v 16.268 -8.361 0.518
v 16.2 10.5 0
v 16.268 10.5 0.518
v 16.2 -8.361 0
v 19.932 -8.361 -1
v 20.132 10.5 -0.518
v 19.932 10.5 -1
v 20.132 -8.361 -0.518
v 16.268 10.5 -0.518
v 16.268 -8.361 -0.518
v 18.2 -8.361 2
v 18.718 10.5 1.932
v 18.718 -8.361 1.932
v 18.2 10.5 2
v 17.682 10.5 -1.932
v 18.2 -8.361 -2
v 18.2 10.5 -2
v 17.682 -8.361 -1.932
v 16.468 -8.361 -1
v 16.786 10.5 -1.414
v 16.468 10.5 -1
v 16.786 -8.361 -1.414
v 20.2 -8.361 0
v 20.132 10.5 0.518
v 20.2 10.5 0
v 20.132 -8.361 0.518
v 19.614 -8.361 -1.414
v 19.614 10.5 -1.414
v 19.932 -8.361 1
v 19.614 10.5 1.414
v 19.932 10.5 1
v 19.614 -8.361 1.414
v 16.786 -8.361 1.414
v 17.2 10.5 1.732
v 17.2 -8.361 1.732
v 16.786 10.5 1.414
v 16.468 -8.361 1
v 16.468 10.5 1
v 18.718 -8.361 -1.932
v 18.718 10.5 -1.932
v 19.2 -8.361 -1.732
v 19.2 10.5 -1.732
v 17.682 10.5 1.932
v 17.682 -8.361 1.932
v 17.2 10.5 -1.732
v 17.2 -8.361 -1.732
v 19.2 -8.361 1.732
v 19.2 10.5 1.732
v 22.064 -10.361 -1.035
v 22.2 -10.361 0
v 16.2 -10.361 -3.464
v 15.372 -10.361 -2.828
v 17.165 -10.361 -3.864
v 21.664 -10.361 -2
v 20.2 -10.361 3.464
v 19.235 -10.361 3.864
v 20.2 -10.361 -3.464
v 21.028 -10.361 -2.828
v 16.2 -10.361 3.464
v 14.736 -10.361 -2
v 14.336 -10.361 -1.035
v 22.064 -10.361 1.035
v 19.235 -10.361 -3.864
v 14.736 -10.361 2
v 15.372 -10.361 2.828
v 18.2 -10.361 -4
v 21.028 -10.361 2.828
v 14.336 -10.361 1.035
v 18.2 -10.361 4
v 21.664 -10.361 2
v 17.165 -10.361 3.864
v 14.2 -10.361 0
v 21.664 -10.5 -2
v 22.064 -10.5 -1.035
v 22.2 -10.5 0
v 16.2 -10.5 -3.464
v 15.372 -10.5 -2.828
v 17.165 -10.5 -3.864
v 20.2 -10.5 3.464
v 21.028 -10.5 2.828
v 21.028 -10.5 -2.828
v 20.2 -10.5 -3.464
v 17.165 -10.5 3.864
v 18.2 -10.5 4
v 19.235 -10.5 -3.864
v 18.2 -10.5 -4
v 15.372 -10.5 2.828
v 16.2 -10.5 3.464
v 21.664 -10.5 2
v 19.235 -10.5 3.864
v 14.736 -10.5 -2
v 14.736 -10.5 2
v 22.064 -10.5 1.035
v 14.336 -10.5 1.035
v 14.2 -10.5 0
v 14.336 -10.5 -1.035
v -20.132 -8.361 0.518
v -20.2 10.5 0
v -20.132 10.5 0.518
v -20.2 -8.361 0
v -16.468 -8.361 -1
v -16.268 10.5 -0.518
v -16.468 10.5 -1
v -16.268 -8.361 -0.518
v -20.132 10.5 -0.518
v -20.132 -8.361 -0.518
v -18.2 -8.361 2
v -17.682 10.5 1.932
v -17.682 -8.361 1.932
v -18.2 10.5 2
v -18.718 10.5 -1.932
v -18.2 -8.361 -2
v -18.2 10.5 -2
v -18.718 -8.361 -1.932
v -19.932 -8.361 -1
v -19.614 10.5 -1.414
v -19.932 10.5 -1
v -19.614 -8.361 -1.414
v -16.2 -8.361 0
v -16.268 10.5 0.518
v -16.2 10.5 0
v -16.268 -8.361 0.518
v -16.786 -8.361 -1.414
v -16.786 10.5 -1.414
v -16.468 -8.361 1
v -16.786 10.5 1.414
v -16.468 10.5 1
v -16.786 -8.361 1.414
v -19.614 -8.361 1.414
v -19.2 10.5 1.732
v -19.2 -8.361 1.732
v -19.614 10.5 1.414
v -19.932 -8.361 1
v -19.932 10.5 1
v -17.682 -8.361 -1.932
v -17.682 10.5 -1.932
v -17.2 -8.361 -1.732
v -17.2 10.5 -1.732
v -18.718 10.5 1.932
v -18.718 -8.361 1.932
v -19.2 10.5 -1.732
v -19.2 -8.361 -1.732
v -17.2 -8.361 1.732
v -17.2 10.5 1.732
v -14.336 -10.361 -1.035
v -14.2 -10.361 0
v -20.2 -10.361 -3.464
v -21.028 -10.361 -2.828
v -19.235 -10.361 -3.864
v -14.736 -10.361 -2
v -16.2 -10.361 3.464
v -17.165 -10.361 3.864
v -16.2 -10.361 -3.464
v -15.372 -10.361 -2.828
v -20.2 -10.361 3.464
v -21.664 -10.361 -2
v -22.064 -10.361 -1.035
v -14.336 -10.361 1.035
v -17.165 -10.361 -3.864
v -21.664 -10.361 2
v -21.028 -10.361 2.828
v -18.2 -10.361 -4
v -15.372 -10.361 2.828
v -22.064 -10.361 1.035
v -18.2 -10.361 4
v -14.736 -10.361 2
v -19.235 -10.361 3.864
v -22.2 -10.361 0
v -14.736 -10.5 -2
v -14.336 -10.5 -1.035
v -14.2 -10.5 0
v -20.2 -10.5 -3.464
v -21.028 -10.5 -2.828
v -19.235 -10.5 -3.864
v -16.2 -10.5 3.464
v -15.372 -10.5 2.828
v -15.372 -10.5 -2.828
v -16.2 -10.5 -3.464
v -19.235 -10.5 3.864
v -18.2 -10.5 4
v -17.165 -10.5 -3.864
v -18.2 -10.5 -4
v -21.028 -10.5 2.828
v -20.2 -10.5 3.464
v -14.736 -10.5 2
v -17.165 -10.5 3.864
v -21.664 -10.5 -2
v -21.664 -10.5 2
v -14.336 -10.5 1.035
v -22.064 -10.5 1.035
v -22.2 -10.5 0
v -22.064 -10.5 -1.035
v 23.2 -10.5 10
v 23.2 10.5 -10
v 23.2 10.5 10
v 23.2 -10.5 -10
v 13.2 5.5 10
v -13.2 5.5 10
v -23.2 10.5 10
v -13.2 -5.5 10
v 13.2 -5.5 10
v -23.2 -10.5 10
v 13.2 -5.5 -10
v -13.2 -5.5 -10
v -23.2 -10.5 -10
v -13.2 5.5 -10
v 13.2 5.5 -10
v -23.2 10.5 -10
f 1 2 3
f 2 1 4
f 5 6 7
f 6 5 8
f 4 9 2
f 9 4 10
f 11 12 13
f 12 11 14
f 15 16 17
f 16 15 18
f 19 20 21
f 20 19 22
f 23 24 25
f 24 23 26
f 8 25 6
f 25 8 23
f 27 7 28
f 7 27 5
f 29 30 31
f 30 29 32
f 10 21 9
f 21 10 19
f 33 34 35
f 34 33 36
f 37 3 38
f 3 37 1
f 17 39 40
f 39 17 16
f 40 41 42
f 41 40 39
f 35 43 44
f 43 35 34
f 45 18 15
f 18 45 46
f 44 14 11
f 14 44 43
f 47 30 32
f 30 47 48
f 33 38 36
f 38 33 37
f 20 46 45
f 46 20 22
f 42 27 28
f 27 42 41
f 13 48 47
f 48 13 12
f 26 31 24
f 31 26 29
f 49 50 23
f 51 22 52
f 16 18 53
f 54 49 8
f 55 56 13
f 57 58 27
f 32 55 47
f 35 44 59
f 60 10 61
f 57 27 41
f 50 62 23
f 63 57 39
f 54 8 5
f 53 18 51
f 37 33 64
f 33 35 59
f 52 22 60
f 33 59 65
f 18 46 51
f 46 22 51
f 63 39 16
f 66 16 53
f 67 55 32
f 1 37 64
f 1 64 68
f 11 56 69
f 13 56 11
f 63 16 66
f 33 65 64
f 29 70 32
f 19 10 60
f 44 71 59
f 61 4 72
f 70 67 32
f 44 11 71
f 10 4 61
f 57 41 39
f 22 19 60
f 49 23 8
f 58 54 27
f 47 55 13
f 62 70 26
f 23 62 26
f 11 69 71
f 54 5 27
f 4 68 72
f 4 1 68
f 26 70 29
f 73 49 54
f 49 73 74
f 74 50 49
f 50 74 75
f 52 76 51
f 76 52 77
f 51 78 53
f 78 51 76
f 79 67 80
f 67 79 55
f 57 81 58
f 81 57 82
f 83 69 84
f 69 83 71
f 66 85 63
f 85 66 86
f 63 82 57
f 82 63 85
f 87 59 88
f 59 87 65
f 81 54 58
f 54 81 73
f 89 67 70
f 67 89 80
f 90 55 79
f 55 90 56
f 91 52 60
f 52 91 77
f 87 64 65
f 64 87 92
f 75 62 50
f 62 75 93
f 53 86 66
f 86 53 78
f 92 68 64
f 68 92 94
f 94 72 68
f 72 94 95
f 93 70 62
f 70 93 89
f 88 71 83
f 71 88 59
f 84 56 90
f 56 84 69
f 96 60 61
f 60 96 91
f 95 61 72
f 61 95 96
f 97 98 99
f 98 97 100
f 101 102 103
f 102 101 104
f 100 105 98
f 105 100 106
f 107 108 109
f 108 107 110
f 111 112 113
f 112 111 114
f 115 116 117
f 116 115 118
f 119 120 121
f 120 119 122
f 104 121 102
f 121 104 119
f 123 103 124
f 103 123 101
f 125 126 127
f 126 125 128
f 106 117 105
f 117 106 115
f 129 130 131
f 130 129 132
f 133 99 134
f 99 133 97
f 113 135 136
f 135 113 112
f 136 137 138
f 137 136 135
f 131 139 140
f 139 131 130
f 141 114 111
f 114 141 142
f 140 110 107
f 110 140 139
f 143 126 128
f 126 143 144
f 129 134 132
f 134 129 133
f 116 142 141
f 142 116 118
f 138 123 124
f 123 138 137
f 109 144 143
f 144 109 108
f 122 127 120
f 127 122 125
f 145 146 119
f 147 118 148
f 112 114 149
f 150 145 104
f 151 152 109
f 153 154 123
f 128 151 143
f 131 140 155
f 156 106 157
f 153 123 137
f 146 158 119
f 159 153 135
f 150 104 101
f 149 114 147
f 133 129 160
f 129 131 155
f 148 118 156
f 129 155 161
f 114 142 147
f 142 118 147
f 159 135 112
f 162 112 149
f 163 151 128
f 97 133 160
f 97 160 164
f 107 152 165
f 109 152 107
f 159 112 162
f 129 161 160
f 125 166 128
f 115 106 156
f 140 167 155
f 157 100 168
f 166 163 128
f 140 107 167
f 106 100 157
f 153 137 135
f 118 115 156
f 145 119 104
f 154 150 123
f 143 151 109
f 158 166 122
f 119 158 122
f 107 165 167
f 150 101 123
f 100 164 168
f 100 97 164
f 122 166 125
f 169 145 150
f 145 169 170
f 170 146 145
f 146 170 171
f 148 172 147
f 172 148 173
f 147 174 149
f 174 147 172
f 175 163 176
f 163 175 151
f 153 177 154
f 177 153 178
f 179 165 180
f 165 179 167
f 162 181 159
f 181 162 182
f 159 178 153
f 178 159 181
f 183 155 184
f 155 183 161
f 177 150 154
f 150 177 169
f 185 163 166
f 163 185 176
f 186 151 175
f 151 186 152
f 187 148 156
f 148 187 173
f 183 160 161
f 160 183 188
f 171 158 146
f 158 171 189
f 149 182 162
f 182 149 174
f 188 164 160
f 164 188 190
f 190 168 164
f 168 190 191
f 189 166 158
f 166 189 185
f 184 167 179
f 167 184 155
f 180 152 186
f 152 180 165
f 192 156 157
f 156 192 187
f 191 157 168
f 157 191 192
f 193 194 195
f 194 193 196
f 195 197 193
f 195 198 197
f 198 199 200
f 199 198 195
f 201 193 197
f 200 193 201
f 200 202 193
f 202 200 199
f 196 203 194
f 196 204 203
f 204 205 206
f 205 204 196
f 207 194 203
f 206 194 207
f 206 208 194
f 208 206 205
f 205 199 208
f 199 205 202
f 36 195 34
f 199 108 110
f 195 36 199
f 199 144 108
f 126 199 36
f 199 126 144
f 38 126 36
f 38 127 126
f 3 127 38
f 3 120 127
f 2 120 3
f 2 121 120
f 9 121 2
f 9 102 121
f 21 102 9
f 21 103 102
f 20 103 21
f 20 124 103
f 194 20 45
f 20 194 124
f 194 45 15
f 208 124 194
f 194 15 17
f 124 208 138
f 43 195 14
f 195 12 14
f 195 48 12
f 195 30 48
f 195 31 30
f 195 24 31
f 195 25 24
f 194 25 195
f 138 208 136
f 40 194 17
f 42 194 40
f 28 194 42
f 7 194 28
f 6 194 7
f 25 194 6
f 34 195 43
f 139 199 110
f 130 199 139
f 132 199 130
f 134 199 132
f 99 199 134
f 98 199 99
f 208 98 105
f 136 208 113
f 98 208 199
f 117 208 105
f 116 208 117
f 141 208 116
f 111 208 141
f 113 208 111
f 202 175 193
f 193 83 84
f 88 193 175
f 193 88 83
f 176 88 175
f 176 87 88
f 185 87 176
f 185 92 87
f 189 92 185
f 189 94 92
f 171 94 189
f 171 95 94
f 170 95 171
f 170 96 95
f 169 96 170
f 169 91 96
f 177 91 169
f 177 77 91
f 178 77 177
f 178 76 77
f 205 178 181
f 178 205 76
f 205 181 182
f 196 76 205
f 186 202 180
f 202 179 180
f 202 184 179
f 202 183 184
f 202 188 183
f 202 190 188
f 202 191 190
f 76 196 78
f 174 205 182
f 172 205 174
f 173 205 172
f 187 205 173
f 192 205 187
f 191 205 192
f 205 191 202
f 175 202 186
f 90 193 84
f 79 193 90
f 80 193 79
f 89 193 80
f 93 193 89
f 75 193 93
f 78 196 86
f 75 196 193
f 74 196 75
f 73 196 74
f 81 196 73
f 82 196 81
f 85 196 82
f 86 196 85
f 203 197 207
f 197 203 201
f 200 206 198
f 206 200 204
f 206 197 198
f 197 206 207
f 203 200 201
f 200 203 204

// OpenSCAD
// Bull nose pliers holder 3D Design

// Copyright (c) 2014 by Jeremy Bennett <jeremy.bennett@embecosm.com>

// Crimp holder 3D Design is licensed under a Creative Commons
// Attribution-ShareAlike 3.0 Unported License.

// You should have received a copy of the license along with this work.  If not,
// see <http://creativecommons.org/licenses/by-sa/3.0/>.

// -----------------------------------------------------------------------------


use <MCAD/regular_shapes.scad>


// A screw hole with a countersink
module screwhole (bore, length) {
	iota = length / 100;
	half_length = length / 2 + iota;
	full_length = half_length * 2;
	union () {
		cylinder (r = bore / 2, h = full_length, center = true, $fn = 24);
		translate (v = [0, 0, -half_length + bore / 4 + bore / 10])
			cylinder (r1 = bore, r2 = bore / 2, h = bore / 2, center = true, $fn = 24);
		translate (v = [0, 0, -half_length + bore / 20])
			cylinder (r = bore, h = bore / 10, center = true, $fn = 24);
	}
}


// A screw hole for a screw parallel with the Y axis
module screwhole_y (bore, length, x_off, z_off) {
	translate (v = [x_off, 0, z_off])
		rotate (a = [-90, 0, 0])
			screwhole (bore = bore, length = length);
}


// Support with screwholes
module tool_support () {
	back_thickness = 5;
	front_thickness = 5;
	side_thickness = 10;
	hole_width = 26.4;
	hole_depth = 11;
	block_width = hole_width + side_thickness * 2;
	block_depth = hole_depth + back_thickness + front_thickness;
	height = 20;
	screw_x_off = (hole_width + side_thickness) / 2;
	screw_z_off = 0;
	iota = 0.1;
	difference () {
		cube (size = [block_width, block_depth, height], center = true);
		// hole for strippers
		translate (v = [0, (back_thickness - front_thickness) / 2, 0])
			cube (size = [ hole_width, hole_depth, height + iota], center = true);
		// screw_holes
		screwhole_y (bore = 4, length = block_depth + iota, x_off =  screw_x_off,
		             z_off = screw_z_off);
		screwhole_y (bore = 4, length = block_depth + iota, x_off = -screw_x_off,
		             z_off = screw_z_off);
	}
}


tool_support ();
